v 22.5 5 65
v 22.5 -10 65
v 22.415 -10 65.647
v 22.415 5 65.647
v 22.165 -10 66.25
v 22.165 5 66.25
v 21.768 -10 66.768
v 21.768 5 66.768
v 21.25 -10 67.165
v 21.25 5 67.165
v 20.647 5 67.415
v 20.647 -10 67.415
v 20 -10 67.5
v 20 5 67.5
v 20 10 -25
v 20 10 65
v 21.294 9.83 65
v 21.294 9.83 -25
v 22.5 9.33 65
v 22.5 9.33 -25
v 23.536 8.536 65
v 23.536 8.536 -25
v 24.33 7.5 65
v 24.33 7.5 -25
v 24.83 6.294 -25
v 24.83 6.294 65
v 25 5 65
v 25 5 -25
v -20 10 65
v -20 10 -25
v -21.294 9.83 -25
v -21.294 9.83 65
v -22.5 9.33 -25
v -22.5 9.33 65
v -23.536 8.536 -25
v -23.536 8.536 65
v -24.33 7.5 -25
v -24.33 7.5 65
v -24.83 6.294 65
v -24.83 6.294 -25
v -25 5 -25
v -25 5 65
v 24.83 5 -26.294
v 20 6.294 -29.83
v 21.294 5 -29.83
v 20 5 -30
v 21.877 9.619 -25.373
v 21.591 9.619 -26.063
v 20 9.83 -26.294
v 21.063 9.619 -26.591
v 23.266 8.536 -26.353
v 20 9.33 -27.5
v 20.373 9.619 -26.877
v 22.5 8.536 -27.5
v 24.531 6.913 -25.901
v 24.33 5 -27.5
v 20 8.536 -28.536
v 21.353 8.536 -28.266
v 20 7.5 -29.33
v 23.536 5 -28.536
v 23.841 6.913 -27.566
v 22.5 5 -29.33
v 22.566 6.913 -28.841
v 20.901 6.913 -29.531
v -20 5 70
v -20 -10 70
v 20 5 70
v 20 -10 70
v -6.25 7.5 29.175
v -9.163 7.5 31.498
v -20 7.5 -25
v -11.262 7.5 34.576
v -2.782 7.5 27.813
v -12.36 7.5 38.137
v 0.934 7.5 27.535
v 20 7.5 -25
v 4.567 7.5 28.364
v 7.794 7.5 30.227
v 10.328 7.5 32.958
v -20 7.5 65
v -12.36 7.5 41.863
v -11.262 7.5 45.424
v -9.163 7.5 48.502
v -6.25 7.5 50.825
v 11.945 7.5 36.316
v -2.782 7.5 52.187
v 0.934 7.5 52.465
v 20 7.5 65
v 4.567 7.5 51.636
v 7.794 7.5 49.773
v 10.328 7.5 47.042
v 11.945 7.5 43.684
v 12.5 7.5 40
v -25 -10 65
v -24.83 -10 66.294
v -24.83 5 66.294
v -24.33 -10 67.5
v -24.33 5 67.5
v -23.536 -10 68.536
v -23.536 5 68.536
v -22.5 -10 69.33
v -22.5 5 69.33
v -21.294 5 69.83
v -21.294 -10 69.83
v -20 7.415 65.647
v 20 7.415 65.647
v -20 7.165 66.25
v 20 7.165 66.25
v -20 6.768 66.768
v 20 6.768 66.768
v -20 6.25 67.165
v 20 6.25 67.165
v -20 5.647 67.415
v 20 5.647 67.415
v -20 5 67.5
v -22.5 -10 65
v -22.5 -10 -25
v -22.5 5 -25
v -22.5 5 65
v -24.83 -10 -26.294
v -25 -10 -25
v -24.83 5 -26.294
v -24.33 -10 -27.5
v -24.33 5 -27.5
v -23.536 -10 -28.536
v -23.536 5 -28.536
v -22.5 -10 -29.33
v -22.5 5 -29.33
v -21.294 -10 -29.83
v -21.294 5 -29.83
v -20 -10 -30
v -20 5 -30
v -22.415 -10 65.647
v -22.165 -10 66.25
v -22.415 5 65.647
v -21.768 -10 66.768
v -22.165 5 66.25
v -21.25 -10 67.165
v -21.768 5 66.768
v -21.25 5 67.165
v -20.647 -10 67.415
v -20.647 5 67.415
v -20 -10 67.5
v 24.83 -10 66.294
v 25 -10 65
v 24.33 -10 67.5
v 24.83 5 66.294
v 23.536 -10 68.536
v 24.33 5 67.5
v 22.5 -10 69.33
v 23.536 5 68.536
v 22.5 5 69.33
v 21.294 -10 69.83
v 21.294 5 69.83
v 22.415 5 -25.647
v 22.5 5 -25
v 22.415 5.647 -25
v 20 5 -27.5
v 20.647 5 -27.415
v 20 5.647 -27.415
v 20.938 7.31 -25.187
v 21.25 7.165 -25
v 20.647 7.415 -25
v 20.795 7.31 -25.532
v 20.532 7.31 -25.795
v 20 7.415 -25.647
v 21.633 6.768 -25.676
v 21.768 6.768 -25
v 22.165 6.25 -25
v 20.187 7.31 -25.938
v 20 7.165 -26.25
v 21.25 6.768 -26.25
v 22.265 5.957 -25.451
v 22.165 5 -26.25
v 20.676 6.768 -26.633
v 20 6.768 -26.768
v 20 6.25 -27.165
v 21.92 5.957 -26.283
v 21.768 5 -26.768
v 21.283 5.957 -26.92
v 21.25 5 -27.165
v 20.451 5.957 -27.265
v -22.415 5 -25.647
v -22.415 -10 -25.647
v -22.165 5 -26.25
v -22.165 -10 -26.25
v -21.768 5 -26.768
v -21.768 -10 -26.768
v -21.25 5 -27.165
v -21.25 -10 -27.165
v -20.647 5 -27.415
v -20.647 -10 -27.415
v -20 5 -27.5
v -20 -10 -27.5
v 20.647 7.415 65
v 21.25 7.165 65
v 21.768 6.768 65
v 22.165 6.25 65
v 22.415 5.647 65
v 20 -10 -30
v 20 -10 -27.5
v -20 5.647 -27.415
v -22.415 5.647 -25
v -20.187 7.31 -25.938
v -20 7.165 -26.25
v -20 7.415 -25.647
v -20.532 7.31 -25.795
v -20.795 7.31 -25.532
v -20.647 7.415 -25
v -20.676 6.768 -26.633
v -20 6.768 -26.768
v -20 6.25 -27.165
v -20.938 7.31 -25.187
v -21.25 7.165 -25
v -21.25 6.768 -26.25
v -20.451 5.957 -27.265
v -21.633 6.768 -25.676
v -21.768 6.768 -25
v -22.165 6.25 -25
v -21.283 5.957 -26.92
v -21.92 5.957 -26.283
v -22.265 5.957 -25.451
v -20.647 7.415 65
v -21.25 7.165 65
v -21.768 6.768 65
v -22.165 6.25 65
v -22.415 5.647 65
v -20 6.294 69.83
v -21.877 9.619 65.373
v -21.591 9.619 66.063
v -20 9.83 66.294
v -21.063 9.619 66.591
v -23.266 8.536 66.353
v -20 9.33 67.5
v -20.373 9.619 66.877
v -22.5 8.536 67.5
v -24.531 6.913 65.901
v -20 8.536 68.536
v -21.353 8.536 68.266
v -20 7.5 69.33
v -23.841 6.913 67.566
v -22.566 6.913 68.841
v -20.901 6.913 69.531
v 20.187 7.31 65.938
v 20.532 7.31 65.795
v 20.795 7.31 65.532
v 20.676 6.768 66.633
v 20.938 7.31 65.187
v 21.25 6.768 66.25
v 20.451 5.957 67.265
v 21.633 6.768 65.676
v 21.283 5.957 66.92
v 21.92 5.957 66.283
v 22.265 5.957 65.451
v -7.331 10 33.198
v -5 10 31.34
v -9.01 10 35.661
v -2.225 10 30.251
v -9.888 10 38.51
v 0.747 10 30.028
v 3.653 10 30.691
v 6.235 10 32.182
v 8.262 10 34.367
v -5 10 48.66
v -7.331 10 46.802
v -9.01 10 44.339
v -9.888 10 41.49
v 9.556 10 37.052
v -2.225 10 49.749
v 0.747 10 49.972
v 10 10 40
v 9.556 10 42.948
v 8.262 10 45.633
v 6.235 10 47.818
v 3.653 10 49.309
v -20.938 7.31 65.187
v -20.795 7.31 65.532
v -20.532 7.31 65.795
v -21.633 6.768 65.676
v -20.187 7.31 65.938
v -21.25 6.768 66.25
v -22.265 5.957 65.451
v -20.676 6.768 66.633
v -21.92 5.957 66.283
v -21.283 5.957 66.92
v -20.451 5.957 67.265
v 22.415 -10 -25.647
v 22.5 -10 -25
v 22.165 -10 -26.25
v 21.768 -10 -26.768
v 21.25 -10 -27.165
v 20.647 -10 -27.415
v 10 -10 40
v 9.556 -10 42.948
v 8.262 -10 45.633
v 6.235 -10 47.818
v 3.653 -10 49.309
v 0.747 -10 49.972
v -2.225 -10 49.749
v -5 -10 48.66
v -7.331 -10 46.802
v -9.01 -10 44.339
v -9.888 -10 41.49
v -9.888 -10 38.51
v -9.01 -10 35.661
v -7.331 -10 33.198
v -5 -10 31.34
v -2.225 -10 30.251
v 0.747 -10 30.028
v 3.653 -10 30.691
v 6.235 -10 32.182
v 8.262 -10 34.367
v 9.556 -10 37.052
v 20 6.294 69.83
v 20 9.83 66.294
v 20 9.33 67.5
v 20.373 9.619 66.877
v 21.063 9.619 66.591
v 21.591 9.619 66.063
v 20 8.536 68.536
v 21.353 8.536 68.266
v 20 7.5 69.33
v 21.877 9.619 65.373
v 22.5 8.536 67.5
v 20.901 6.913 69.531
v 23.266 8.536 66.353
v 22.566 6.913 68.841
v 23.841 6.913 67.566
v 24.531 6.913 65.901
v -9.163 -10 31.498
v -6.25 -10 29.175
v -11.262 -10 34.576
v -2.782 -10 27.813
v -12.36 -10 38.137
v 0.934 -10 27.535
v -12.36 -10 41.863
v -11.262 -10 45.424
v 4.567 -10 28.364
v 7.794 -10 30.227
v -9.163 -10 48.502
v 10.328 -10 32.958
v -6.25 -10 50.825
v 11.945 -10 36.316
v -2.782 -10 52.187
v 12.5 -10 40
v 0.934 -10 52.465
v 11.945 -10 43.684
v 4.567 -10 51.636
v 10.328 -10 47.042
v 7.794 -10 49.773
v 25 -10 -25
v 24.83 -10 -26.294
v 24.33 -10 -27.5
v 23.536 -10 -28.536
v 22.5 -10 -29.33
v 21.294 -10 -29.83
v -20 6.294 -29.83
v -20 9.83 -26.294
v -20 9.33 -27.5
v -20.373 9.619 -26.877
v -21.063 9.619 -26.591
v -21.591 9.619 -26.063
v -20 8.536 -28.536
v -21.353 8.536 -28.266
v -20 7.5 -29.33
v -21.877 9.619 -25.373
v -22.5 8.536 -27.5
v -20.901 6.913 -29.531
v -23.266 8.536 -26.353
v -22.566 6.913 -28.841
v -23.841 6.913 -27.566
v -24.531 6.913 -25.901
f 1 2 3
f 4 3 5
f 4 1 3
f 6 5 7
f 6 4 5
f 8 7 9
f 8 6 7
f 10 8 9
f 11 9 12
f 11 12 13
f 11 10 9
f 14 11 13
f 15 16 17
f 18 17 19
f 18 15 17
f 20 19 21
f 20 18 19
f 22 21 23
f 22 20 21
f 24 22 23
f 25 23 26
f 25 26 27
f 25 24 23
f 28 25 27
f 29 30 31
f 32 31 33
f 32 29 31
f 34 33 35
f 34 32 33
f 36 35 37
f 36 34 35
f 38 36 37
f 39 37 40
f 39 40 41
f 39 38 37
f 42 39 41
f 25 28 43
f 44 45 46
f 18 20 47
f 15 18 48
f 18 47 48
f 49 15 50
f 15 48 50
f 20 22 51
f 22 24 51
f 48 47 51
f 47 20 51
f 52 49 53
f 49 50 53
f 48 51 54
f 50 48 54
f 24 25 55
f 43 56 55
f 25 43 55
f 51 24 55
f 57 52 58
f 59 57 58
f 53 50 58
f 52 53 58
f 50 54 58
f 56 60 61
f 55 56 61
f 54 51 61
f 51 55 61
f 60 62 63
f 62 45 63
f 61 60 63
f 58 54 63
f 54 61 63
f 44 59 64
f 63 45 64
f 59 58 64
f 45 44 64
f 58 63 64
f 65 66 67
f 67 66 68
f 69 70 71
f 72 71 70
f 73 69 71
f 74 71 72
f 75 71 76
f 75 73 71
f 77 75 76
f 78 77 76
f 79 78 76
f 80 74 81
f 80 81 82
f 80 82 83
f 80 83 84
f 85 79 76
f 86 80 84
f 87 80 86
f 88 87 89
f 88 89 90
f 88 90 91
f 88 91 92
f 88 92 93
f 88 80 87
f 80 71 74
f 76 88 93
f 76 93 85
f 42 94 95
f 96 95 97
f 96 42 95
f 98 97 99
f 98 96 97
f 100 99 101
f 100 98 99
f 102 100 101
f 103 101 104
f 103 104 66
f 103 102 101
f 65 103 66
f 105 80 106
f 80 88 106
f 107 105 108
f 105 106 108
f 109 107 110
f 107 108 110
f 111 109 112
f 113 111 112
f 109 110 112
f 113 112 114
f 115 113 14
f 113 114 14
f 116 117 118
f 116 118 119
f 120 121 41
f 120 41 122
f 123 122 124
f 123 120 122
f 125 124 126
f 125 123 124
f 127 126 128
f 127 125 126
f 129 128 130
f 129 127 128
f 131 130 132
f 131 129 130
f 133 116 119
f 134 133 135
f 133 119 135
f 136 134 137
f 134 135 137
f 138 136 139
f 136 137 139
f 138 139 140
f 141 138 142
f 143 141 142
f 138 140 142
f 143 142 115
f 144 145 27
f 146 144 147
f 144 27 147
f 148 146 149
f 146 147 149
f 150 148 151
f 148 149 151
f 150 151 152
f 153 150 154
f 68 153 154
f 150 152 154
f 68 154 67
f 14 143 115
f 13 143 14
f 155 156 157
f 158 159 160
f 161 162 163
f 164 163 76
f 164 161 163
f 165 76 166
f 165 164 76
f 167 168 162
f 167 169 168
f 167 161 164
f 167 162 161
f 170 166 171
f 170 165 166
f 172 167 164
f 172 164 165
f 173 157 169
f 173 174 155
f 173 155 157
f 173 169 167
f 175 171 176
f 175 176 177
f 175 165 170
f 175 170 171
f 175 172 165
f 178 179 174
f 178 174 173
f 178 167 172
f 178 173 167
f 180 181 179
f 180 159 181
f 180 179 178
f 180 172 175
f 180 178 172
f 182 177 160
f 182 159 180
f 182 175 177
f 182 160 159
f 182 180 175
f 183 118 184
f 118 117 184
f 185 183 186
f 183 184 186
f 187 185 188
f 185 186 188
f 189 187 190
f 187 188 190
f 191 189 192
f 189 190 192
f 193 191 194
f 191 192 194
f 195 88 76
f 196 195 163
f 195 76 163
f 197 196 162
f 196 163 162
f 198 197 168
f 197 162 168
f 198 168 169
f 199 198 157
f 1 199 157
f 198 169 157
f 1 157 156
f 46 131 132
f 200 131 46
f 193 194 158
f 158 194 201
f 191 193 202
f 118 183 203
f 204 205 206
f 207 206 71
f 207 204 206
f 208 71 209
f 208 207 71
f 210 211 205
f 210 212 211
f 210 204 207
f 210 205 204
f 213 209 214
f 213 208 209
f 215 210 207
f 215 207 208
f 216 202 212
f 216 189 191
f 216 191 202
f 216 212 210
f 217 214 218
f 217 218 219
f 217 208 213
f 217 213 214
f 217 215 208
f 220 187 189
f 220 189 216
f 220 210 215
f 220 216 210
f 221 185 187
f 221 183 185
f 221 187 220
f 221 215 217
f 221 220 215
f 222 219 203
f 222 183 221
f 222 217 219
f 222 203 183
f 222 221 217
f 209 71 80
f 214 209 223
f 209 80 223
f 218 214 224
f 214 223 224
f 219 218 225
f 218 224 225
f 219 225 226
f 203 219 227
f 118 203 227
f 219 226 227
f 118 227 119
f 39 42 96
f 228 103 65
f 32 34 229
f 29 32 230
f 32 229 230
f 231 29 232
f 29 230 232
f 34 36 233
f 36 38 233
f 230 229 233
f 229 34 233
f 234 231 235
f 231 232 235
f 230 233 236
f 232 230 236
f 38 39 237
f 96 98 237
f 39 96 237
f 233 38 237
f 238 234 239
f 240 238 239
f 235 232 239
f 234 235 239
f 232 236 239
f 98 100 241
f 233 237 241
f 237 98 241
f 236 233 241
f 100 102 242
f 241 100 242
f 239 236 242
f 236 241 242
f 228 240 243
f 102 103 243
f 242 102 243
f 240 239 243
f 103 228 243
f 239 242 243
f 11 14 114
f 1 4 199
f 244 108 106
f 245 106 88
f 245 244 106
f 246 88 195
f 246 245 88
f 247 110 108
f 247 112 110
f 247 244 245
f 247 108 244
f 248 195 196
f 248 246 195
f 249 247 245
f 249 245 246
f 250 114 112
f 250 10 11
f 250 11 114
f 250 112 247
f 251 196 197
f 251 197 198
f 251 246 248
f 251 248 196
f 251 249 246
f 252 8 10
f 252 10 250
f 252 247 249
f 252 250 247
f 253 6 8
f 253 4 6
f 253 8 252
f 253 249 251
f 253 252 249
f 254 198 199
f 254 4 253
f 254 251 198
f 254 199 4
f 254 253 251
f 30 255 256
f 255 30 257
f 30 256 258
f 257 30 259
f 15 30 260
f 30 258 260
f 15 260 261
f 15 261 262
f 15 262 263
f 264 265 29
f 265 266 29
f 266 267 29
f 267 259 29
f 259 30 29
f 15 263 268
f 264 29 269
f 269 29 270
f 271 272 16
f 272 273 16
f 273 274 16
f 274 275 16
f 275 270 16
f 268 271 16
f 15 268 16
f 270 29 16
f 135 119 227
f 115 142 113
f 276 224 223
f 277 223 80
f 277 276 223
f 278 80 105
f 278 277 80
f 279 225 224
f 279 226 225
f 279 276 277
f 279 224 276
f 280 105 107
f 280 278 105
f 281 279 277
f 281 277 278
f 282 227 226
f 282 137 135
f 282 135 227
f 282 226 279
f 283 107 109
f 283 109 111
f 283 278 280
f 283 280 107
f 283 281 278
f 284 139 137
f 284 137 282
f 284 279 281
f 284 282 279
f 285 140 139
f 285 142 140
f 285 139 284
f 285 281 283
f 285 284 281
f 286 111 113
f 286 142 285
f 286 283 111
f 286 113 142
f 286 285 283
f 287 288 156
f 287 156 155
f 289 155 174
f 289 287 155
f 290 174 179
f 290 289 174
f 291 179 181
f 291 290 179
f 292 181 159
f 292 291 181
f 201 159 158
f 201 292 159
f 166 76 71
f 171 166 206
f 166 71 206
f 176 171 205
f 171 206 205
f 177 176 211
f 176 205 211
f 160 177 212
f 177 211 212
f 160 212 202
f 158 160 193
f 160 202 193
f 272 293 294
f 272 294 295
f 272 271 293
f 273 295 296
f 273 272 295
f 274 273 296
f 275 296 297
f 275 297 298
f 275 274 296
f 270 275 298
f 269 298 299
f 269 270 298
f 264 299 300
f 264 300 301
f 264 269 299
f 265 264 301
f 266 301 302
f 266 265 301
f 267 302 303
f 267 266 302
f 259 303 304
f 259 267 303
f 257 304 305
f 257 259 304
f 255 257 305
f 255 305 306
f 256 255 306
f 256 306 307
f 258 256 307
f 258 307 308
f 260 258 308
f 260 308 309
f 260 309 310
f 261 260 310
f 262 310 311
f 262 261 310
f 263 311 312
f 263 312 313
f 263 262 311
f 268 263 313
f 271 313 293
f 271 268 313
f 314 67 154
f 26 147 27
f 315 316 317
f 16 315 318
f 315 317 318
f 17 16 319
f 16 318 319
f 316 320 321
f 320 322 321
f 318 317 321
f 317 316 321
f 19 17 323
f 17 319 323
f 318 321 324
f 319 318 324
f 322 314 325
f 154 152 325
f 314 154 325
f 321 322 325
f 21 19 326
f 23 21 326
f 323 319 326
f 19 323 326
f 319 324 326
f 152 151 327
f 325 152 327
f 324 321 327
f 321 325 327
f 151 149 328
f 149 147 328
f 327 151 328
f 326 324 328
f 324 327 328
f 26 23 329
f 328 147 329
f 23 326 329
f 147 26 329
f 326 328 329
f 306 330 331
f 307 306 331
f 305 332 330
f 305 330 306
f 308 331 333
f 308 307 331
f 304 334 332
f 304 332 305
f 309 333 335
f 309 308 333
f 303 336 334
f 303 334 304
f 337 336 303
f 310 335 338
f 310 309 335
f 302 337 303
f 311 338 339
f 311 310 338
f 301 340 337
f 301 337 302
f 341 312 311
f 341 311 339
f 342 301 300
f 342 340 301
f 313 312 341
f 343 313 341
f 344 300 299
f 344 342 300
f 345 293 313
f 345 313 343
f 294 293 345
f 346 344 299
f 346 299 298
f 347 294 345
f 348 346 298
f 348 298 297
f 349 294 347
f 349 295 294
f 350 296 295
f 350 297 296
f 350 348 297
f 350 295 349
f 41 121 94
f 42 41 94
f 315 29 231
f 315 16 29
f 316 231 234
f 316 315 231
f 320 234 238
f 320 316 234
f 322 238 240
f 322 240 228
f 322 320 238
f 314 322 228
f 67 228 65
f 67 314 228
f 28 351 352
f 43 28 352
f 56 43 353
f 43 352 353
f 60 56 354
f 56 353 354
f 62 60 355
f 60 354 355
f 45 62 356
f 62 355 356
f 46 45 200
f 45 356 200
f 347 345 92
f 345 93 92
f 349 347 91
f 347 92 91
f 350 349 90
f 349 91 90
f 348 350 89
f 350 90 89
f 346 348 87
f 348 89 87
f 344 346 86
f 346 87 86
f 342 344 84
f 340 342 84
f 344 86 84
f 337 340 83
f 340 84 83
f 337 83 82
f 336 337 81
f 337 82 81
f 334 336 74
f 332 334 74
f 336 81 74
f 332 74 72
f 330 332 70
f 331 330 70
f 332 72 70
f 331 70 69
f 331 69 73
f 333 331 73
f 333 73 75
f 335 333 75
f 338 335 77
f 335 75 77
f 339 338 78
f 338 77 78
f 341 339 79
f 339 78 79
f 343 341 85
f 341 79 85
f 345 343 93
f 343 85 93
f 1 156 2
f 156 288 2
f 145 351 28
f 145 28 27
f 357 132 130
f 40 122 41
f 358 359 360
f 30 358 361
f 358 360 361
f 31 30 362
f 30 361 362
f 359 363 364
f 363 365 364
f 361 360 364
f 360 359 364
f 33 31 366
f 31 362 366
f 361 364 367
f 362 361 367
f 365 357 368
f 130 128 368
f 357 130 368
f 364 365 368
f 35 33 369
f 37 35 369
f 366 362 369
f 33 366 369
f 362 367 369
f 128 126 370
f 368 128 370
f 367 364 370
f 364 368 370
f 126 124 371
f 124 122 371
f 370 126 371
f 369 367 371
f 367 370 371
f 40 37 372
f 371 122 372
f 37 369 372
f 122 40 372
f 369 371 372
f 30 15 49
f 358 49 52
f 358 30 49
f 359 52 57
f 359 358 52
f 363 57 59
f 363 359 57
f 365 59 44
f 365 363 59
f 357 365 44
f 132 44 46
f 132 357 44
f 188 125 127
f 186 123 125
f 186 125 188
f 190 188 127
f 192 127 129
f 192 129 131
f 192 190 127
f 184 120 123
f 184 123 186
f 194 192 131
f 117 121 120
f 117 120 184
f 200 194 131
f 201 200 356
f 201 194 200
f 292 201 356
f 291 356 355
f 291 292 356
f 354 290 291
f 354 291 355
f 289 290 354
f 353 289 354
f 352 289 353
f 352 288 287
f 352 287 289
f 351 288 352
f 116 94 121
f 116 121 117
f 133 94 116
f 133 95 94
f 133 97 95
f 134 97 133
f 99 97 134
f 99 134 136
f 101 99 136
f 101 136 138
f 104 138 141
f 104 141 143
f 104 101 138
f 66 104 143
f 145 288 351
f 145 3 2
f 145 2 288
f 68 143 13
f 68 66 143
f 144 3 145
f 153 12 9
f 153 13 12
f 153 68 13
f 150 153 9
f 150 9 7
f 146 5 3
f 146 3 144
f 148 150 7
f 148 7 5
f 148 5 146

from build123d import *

# Parameters (mm, degrees)
F0_W     = 50
F0_H     = 100
F0_R     = 10
F1_DEPTH = 10
F2_R     = 5
F3_R     = 5
F4_T     = -2.5


with BuildPart() as f1:
    # F0 (on Front) → F1 (new body, symmetric)
    with BuildSketch(Plane.XZ):
        with Locations((0, 20)):
            Rectangle(F0_W, F0_H)
        Circle(F0_R, mode=Mode.SUBTRACT)
        with Locations((0, 40)):
            Circle(F0_R, mode=Mode.SUBTRACT)
        Circle(F0_R)
    extrude(amount=F1_DEPTH, both=True)

    # F2
    f2_edges = [f1.edges().sort_by_distance(p)[0] for p in [
        (-25, 0, 70),
        (25, 0, 70),
        (-25, 0, -30),
        (25, 0, -30),
    ]]
    fillet(f2_edges, radius=F2_R)

    # F3
    f3_edges = [f1.edges().sort_by_distance(p)[0] for p in [
        (0, 10, 70),
        (23.535534, 10, 68.535534),
        (25, 10, 20),
        (23.535534, 10, -28.535534),
        (0, 10, -30),
        (-23.535534, 10, -28.535534),
        (-25, 10, 20),
        (-23.535534, 10, 68.535534),
    ]]
    fillet(f3_edges, radius=F3_R)

    # F4
    f4_openings = [f1.faces().sort_by_distance(p)[0] for p in [
        (0, -10, 18.652943),
    ]]
    offset(amount=F4_T, openings=f4_openings)


solid = f1.part
